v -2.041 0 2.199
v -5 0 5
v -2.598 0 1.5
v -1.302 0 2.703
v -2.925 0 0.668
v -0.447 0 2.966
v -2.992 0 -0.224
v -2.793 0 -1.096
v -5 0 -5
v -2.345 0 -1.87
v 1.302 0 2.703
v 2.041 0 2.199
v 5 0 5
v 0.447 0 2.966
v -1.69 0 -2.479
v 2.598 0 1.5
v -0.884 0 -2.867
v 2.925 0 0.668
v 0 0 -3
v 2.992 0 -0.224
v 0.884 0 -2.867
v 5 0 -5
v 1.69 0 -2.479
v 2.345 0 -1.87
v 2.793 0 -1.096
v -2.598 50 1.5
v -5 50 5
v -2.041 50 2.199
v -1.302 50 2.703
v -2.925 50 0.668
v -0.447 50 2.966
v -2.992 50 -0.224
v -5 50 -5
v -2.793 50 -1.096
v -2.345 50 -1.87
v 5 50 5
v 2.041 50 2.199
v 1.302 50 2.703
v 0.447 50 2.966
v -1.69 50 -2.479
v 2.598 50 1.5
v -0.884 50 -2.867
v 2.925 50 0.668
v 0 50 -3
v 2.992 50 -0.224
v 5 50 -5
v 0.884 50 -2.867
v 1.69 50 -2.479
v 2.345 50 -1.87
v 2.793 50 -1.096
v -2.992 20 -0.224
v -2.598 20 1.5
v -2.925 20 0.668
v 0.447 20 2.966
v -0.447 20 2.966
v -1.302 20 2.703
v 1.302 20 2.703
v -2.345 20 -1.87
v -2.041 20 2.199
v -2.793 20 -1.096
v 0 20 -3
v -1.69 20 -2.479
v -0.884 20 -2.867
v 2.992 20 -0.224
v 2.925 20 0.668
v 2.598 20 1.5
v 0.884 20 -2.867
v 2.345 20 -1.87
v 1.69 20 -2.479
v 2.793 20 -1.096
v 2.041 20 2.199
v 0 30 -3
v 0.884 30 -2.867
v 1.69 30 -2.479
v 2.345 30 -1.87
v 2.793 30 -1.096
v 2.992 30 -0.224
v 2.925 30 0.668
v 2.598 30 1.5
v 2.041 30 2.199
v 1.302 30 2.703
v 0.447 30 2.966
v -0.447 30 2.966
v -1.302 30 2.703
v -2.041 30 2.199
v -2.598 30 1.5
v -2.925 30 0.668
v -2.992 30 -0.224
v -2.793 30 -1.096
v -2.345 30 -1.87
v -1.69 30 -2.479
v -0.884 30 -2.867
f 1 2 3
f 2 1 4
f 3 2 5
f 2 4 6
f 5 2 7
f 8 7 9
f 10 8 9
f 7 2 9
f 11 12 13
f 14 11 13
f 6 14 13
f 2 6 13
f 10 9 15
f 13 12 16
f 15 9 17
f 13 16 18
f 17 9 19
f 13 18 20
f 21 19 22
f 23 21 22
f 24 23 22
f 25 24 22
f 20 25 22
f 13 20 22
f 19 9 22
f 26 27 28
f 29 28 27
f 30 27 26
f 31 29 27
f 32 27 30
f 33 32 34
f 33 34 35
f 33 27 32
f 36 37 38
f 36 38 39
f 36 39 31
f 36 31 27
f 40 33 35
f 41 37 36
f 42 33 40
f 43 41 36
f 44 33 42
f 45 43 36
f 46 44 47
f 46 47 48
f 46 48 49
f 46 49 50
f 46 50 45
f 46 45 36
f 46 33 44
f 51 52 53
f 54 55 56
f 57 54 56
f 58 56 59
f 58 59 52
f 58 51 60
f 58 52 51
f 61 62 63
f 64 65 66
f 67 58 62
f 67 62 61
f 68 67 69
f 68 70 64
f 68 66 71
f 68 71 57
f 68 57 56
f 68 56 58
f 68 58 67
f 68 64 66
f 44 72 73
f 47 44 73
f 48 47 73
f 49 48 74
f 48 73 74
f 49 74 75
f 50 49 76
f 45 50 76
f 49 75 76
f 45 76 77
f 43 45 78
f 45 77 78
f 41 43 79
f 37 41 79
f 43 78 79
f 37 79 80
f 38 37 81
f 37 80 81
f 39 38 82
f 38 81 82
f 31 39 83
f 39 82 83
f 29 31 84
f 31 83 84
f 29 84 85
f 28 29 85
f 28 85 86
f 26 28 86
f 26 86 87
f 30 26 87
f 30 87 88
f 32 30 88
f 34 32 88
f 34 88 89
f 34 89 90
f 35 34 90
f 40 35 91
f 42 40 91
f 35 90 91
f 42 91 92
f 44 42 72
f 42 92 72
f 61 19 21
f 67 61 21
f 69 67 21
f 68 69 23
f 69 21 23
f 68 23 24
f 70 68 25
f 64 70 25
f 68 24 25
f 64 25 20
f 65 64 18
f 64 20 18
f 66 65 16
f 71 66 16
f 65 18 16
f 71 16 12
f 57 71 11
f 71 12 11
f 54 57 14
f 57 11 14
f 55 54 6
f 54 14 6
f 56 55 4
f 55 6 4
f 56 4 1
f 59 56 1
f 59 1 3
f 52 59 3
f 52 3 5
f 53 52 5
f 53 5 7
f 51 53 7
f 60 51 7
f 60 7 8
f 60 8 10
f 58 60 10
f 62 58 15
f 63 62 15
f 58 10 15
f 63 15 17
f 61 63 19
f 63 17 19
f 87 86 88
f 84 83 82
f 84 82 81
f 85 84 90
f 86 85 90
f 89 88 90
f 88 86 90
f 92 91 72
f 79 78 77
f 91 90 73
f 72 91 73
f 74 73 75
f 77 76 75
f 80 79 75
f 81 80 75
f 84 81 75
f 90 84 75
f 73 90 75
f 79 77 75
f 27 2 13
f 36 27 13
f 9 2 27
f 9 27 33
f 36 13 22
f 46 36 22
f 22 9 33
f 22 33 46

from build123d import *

# Parameters (mm, degrees)
SKETCH1_W           = 10
SKETCH1_H           = 10
BOSS_EXTRUDE1_DEPTH = 50
SKETCH2_R           = 3
CUT_EXTRUDE1_DEPTH  = 20
LPATTERN1_COUNT     = 2
LPATTERN1_PITCH     = 30


with BuildPart() as part:
    # Sketch1 → Boss-Extrude1 (new body)
    with BuildSketch(Plane(origin=(0, 0, 0), x_dir=(1, 0, 0), z_dir=(0, 1, 0))):
        Rectangle(SKETCH1_W, SKETCH1_H)
    extrude(amount=BOSS_EXTRUDE1_DEPTH)

    # Sketch2 → Cut-Extrude1 (cut)
    with BuildSketch(Plane.XZ):
        with Locations(Location((0, 0, 0), (0, 0, 270))):
            Circle(SKETCH2_R)
    cut_extrude1 = extrude(amount=-CUT_EXTRUDE1_DEPTH, mode=Mode.SUBTRACT)

    # LPattern1: Cut-Extrude1 ×2
    with Locations(*[(0, i * LPATTERN1_PITCH, 0) for i in range(1, LPATTERN1_COUNT)]):
        add(cut_extrude1, mode=Mode.SUBTRACT)


solid = part.part
